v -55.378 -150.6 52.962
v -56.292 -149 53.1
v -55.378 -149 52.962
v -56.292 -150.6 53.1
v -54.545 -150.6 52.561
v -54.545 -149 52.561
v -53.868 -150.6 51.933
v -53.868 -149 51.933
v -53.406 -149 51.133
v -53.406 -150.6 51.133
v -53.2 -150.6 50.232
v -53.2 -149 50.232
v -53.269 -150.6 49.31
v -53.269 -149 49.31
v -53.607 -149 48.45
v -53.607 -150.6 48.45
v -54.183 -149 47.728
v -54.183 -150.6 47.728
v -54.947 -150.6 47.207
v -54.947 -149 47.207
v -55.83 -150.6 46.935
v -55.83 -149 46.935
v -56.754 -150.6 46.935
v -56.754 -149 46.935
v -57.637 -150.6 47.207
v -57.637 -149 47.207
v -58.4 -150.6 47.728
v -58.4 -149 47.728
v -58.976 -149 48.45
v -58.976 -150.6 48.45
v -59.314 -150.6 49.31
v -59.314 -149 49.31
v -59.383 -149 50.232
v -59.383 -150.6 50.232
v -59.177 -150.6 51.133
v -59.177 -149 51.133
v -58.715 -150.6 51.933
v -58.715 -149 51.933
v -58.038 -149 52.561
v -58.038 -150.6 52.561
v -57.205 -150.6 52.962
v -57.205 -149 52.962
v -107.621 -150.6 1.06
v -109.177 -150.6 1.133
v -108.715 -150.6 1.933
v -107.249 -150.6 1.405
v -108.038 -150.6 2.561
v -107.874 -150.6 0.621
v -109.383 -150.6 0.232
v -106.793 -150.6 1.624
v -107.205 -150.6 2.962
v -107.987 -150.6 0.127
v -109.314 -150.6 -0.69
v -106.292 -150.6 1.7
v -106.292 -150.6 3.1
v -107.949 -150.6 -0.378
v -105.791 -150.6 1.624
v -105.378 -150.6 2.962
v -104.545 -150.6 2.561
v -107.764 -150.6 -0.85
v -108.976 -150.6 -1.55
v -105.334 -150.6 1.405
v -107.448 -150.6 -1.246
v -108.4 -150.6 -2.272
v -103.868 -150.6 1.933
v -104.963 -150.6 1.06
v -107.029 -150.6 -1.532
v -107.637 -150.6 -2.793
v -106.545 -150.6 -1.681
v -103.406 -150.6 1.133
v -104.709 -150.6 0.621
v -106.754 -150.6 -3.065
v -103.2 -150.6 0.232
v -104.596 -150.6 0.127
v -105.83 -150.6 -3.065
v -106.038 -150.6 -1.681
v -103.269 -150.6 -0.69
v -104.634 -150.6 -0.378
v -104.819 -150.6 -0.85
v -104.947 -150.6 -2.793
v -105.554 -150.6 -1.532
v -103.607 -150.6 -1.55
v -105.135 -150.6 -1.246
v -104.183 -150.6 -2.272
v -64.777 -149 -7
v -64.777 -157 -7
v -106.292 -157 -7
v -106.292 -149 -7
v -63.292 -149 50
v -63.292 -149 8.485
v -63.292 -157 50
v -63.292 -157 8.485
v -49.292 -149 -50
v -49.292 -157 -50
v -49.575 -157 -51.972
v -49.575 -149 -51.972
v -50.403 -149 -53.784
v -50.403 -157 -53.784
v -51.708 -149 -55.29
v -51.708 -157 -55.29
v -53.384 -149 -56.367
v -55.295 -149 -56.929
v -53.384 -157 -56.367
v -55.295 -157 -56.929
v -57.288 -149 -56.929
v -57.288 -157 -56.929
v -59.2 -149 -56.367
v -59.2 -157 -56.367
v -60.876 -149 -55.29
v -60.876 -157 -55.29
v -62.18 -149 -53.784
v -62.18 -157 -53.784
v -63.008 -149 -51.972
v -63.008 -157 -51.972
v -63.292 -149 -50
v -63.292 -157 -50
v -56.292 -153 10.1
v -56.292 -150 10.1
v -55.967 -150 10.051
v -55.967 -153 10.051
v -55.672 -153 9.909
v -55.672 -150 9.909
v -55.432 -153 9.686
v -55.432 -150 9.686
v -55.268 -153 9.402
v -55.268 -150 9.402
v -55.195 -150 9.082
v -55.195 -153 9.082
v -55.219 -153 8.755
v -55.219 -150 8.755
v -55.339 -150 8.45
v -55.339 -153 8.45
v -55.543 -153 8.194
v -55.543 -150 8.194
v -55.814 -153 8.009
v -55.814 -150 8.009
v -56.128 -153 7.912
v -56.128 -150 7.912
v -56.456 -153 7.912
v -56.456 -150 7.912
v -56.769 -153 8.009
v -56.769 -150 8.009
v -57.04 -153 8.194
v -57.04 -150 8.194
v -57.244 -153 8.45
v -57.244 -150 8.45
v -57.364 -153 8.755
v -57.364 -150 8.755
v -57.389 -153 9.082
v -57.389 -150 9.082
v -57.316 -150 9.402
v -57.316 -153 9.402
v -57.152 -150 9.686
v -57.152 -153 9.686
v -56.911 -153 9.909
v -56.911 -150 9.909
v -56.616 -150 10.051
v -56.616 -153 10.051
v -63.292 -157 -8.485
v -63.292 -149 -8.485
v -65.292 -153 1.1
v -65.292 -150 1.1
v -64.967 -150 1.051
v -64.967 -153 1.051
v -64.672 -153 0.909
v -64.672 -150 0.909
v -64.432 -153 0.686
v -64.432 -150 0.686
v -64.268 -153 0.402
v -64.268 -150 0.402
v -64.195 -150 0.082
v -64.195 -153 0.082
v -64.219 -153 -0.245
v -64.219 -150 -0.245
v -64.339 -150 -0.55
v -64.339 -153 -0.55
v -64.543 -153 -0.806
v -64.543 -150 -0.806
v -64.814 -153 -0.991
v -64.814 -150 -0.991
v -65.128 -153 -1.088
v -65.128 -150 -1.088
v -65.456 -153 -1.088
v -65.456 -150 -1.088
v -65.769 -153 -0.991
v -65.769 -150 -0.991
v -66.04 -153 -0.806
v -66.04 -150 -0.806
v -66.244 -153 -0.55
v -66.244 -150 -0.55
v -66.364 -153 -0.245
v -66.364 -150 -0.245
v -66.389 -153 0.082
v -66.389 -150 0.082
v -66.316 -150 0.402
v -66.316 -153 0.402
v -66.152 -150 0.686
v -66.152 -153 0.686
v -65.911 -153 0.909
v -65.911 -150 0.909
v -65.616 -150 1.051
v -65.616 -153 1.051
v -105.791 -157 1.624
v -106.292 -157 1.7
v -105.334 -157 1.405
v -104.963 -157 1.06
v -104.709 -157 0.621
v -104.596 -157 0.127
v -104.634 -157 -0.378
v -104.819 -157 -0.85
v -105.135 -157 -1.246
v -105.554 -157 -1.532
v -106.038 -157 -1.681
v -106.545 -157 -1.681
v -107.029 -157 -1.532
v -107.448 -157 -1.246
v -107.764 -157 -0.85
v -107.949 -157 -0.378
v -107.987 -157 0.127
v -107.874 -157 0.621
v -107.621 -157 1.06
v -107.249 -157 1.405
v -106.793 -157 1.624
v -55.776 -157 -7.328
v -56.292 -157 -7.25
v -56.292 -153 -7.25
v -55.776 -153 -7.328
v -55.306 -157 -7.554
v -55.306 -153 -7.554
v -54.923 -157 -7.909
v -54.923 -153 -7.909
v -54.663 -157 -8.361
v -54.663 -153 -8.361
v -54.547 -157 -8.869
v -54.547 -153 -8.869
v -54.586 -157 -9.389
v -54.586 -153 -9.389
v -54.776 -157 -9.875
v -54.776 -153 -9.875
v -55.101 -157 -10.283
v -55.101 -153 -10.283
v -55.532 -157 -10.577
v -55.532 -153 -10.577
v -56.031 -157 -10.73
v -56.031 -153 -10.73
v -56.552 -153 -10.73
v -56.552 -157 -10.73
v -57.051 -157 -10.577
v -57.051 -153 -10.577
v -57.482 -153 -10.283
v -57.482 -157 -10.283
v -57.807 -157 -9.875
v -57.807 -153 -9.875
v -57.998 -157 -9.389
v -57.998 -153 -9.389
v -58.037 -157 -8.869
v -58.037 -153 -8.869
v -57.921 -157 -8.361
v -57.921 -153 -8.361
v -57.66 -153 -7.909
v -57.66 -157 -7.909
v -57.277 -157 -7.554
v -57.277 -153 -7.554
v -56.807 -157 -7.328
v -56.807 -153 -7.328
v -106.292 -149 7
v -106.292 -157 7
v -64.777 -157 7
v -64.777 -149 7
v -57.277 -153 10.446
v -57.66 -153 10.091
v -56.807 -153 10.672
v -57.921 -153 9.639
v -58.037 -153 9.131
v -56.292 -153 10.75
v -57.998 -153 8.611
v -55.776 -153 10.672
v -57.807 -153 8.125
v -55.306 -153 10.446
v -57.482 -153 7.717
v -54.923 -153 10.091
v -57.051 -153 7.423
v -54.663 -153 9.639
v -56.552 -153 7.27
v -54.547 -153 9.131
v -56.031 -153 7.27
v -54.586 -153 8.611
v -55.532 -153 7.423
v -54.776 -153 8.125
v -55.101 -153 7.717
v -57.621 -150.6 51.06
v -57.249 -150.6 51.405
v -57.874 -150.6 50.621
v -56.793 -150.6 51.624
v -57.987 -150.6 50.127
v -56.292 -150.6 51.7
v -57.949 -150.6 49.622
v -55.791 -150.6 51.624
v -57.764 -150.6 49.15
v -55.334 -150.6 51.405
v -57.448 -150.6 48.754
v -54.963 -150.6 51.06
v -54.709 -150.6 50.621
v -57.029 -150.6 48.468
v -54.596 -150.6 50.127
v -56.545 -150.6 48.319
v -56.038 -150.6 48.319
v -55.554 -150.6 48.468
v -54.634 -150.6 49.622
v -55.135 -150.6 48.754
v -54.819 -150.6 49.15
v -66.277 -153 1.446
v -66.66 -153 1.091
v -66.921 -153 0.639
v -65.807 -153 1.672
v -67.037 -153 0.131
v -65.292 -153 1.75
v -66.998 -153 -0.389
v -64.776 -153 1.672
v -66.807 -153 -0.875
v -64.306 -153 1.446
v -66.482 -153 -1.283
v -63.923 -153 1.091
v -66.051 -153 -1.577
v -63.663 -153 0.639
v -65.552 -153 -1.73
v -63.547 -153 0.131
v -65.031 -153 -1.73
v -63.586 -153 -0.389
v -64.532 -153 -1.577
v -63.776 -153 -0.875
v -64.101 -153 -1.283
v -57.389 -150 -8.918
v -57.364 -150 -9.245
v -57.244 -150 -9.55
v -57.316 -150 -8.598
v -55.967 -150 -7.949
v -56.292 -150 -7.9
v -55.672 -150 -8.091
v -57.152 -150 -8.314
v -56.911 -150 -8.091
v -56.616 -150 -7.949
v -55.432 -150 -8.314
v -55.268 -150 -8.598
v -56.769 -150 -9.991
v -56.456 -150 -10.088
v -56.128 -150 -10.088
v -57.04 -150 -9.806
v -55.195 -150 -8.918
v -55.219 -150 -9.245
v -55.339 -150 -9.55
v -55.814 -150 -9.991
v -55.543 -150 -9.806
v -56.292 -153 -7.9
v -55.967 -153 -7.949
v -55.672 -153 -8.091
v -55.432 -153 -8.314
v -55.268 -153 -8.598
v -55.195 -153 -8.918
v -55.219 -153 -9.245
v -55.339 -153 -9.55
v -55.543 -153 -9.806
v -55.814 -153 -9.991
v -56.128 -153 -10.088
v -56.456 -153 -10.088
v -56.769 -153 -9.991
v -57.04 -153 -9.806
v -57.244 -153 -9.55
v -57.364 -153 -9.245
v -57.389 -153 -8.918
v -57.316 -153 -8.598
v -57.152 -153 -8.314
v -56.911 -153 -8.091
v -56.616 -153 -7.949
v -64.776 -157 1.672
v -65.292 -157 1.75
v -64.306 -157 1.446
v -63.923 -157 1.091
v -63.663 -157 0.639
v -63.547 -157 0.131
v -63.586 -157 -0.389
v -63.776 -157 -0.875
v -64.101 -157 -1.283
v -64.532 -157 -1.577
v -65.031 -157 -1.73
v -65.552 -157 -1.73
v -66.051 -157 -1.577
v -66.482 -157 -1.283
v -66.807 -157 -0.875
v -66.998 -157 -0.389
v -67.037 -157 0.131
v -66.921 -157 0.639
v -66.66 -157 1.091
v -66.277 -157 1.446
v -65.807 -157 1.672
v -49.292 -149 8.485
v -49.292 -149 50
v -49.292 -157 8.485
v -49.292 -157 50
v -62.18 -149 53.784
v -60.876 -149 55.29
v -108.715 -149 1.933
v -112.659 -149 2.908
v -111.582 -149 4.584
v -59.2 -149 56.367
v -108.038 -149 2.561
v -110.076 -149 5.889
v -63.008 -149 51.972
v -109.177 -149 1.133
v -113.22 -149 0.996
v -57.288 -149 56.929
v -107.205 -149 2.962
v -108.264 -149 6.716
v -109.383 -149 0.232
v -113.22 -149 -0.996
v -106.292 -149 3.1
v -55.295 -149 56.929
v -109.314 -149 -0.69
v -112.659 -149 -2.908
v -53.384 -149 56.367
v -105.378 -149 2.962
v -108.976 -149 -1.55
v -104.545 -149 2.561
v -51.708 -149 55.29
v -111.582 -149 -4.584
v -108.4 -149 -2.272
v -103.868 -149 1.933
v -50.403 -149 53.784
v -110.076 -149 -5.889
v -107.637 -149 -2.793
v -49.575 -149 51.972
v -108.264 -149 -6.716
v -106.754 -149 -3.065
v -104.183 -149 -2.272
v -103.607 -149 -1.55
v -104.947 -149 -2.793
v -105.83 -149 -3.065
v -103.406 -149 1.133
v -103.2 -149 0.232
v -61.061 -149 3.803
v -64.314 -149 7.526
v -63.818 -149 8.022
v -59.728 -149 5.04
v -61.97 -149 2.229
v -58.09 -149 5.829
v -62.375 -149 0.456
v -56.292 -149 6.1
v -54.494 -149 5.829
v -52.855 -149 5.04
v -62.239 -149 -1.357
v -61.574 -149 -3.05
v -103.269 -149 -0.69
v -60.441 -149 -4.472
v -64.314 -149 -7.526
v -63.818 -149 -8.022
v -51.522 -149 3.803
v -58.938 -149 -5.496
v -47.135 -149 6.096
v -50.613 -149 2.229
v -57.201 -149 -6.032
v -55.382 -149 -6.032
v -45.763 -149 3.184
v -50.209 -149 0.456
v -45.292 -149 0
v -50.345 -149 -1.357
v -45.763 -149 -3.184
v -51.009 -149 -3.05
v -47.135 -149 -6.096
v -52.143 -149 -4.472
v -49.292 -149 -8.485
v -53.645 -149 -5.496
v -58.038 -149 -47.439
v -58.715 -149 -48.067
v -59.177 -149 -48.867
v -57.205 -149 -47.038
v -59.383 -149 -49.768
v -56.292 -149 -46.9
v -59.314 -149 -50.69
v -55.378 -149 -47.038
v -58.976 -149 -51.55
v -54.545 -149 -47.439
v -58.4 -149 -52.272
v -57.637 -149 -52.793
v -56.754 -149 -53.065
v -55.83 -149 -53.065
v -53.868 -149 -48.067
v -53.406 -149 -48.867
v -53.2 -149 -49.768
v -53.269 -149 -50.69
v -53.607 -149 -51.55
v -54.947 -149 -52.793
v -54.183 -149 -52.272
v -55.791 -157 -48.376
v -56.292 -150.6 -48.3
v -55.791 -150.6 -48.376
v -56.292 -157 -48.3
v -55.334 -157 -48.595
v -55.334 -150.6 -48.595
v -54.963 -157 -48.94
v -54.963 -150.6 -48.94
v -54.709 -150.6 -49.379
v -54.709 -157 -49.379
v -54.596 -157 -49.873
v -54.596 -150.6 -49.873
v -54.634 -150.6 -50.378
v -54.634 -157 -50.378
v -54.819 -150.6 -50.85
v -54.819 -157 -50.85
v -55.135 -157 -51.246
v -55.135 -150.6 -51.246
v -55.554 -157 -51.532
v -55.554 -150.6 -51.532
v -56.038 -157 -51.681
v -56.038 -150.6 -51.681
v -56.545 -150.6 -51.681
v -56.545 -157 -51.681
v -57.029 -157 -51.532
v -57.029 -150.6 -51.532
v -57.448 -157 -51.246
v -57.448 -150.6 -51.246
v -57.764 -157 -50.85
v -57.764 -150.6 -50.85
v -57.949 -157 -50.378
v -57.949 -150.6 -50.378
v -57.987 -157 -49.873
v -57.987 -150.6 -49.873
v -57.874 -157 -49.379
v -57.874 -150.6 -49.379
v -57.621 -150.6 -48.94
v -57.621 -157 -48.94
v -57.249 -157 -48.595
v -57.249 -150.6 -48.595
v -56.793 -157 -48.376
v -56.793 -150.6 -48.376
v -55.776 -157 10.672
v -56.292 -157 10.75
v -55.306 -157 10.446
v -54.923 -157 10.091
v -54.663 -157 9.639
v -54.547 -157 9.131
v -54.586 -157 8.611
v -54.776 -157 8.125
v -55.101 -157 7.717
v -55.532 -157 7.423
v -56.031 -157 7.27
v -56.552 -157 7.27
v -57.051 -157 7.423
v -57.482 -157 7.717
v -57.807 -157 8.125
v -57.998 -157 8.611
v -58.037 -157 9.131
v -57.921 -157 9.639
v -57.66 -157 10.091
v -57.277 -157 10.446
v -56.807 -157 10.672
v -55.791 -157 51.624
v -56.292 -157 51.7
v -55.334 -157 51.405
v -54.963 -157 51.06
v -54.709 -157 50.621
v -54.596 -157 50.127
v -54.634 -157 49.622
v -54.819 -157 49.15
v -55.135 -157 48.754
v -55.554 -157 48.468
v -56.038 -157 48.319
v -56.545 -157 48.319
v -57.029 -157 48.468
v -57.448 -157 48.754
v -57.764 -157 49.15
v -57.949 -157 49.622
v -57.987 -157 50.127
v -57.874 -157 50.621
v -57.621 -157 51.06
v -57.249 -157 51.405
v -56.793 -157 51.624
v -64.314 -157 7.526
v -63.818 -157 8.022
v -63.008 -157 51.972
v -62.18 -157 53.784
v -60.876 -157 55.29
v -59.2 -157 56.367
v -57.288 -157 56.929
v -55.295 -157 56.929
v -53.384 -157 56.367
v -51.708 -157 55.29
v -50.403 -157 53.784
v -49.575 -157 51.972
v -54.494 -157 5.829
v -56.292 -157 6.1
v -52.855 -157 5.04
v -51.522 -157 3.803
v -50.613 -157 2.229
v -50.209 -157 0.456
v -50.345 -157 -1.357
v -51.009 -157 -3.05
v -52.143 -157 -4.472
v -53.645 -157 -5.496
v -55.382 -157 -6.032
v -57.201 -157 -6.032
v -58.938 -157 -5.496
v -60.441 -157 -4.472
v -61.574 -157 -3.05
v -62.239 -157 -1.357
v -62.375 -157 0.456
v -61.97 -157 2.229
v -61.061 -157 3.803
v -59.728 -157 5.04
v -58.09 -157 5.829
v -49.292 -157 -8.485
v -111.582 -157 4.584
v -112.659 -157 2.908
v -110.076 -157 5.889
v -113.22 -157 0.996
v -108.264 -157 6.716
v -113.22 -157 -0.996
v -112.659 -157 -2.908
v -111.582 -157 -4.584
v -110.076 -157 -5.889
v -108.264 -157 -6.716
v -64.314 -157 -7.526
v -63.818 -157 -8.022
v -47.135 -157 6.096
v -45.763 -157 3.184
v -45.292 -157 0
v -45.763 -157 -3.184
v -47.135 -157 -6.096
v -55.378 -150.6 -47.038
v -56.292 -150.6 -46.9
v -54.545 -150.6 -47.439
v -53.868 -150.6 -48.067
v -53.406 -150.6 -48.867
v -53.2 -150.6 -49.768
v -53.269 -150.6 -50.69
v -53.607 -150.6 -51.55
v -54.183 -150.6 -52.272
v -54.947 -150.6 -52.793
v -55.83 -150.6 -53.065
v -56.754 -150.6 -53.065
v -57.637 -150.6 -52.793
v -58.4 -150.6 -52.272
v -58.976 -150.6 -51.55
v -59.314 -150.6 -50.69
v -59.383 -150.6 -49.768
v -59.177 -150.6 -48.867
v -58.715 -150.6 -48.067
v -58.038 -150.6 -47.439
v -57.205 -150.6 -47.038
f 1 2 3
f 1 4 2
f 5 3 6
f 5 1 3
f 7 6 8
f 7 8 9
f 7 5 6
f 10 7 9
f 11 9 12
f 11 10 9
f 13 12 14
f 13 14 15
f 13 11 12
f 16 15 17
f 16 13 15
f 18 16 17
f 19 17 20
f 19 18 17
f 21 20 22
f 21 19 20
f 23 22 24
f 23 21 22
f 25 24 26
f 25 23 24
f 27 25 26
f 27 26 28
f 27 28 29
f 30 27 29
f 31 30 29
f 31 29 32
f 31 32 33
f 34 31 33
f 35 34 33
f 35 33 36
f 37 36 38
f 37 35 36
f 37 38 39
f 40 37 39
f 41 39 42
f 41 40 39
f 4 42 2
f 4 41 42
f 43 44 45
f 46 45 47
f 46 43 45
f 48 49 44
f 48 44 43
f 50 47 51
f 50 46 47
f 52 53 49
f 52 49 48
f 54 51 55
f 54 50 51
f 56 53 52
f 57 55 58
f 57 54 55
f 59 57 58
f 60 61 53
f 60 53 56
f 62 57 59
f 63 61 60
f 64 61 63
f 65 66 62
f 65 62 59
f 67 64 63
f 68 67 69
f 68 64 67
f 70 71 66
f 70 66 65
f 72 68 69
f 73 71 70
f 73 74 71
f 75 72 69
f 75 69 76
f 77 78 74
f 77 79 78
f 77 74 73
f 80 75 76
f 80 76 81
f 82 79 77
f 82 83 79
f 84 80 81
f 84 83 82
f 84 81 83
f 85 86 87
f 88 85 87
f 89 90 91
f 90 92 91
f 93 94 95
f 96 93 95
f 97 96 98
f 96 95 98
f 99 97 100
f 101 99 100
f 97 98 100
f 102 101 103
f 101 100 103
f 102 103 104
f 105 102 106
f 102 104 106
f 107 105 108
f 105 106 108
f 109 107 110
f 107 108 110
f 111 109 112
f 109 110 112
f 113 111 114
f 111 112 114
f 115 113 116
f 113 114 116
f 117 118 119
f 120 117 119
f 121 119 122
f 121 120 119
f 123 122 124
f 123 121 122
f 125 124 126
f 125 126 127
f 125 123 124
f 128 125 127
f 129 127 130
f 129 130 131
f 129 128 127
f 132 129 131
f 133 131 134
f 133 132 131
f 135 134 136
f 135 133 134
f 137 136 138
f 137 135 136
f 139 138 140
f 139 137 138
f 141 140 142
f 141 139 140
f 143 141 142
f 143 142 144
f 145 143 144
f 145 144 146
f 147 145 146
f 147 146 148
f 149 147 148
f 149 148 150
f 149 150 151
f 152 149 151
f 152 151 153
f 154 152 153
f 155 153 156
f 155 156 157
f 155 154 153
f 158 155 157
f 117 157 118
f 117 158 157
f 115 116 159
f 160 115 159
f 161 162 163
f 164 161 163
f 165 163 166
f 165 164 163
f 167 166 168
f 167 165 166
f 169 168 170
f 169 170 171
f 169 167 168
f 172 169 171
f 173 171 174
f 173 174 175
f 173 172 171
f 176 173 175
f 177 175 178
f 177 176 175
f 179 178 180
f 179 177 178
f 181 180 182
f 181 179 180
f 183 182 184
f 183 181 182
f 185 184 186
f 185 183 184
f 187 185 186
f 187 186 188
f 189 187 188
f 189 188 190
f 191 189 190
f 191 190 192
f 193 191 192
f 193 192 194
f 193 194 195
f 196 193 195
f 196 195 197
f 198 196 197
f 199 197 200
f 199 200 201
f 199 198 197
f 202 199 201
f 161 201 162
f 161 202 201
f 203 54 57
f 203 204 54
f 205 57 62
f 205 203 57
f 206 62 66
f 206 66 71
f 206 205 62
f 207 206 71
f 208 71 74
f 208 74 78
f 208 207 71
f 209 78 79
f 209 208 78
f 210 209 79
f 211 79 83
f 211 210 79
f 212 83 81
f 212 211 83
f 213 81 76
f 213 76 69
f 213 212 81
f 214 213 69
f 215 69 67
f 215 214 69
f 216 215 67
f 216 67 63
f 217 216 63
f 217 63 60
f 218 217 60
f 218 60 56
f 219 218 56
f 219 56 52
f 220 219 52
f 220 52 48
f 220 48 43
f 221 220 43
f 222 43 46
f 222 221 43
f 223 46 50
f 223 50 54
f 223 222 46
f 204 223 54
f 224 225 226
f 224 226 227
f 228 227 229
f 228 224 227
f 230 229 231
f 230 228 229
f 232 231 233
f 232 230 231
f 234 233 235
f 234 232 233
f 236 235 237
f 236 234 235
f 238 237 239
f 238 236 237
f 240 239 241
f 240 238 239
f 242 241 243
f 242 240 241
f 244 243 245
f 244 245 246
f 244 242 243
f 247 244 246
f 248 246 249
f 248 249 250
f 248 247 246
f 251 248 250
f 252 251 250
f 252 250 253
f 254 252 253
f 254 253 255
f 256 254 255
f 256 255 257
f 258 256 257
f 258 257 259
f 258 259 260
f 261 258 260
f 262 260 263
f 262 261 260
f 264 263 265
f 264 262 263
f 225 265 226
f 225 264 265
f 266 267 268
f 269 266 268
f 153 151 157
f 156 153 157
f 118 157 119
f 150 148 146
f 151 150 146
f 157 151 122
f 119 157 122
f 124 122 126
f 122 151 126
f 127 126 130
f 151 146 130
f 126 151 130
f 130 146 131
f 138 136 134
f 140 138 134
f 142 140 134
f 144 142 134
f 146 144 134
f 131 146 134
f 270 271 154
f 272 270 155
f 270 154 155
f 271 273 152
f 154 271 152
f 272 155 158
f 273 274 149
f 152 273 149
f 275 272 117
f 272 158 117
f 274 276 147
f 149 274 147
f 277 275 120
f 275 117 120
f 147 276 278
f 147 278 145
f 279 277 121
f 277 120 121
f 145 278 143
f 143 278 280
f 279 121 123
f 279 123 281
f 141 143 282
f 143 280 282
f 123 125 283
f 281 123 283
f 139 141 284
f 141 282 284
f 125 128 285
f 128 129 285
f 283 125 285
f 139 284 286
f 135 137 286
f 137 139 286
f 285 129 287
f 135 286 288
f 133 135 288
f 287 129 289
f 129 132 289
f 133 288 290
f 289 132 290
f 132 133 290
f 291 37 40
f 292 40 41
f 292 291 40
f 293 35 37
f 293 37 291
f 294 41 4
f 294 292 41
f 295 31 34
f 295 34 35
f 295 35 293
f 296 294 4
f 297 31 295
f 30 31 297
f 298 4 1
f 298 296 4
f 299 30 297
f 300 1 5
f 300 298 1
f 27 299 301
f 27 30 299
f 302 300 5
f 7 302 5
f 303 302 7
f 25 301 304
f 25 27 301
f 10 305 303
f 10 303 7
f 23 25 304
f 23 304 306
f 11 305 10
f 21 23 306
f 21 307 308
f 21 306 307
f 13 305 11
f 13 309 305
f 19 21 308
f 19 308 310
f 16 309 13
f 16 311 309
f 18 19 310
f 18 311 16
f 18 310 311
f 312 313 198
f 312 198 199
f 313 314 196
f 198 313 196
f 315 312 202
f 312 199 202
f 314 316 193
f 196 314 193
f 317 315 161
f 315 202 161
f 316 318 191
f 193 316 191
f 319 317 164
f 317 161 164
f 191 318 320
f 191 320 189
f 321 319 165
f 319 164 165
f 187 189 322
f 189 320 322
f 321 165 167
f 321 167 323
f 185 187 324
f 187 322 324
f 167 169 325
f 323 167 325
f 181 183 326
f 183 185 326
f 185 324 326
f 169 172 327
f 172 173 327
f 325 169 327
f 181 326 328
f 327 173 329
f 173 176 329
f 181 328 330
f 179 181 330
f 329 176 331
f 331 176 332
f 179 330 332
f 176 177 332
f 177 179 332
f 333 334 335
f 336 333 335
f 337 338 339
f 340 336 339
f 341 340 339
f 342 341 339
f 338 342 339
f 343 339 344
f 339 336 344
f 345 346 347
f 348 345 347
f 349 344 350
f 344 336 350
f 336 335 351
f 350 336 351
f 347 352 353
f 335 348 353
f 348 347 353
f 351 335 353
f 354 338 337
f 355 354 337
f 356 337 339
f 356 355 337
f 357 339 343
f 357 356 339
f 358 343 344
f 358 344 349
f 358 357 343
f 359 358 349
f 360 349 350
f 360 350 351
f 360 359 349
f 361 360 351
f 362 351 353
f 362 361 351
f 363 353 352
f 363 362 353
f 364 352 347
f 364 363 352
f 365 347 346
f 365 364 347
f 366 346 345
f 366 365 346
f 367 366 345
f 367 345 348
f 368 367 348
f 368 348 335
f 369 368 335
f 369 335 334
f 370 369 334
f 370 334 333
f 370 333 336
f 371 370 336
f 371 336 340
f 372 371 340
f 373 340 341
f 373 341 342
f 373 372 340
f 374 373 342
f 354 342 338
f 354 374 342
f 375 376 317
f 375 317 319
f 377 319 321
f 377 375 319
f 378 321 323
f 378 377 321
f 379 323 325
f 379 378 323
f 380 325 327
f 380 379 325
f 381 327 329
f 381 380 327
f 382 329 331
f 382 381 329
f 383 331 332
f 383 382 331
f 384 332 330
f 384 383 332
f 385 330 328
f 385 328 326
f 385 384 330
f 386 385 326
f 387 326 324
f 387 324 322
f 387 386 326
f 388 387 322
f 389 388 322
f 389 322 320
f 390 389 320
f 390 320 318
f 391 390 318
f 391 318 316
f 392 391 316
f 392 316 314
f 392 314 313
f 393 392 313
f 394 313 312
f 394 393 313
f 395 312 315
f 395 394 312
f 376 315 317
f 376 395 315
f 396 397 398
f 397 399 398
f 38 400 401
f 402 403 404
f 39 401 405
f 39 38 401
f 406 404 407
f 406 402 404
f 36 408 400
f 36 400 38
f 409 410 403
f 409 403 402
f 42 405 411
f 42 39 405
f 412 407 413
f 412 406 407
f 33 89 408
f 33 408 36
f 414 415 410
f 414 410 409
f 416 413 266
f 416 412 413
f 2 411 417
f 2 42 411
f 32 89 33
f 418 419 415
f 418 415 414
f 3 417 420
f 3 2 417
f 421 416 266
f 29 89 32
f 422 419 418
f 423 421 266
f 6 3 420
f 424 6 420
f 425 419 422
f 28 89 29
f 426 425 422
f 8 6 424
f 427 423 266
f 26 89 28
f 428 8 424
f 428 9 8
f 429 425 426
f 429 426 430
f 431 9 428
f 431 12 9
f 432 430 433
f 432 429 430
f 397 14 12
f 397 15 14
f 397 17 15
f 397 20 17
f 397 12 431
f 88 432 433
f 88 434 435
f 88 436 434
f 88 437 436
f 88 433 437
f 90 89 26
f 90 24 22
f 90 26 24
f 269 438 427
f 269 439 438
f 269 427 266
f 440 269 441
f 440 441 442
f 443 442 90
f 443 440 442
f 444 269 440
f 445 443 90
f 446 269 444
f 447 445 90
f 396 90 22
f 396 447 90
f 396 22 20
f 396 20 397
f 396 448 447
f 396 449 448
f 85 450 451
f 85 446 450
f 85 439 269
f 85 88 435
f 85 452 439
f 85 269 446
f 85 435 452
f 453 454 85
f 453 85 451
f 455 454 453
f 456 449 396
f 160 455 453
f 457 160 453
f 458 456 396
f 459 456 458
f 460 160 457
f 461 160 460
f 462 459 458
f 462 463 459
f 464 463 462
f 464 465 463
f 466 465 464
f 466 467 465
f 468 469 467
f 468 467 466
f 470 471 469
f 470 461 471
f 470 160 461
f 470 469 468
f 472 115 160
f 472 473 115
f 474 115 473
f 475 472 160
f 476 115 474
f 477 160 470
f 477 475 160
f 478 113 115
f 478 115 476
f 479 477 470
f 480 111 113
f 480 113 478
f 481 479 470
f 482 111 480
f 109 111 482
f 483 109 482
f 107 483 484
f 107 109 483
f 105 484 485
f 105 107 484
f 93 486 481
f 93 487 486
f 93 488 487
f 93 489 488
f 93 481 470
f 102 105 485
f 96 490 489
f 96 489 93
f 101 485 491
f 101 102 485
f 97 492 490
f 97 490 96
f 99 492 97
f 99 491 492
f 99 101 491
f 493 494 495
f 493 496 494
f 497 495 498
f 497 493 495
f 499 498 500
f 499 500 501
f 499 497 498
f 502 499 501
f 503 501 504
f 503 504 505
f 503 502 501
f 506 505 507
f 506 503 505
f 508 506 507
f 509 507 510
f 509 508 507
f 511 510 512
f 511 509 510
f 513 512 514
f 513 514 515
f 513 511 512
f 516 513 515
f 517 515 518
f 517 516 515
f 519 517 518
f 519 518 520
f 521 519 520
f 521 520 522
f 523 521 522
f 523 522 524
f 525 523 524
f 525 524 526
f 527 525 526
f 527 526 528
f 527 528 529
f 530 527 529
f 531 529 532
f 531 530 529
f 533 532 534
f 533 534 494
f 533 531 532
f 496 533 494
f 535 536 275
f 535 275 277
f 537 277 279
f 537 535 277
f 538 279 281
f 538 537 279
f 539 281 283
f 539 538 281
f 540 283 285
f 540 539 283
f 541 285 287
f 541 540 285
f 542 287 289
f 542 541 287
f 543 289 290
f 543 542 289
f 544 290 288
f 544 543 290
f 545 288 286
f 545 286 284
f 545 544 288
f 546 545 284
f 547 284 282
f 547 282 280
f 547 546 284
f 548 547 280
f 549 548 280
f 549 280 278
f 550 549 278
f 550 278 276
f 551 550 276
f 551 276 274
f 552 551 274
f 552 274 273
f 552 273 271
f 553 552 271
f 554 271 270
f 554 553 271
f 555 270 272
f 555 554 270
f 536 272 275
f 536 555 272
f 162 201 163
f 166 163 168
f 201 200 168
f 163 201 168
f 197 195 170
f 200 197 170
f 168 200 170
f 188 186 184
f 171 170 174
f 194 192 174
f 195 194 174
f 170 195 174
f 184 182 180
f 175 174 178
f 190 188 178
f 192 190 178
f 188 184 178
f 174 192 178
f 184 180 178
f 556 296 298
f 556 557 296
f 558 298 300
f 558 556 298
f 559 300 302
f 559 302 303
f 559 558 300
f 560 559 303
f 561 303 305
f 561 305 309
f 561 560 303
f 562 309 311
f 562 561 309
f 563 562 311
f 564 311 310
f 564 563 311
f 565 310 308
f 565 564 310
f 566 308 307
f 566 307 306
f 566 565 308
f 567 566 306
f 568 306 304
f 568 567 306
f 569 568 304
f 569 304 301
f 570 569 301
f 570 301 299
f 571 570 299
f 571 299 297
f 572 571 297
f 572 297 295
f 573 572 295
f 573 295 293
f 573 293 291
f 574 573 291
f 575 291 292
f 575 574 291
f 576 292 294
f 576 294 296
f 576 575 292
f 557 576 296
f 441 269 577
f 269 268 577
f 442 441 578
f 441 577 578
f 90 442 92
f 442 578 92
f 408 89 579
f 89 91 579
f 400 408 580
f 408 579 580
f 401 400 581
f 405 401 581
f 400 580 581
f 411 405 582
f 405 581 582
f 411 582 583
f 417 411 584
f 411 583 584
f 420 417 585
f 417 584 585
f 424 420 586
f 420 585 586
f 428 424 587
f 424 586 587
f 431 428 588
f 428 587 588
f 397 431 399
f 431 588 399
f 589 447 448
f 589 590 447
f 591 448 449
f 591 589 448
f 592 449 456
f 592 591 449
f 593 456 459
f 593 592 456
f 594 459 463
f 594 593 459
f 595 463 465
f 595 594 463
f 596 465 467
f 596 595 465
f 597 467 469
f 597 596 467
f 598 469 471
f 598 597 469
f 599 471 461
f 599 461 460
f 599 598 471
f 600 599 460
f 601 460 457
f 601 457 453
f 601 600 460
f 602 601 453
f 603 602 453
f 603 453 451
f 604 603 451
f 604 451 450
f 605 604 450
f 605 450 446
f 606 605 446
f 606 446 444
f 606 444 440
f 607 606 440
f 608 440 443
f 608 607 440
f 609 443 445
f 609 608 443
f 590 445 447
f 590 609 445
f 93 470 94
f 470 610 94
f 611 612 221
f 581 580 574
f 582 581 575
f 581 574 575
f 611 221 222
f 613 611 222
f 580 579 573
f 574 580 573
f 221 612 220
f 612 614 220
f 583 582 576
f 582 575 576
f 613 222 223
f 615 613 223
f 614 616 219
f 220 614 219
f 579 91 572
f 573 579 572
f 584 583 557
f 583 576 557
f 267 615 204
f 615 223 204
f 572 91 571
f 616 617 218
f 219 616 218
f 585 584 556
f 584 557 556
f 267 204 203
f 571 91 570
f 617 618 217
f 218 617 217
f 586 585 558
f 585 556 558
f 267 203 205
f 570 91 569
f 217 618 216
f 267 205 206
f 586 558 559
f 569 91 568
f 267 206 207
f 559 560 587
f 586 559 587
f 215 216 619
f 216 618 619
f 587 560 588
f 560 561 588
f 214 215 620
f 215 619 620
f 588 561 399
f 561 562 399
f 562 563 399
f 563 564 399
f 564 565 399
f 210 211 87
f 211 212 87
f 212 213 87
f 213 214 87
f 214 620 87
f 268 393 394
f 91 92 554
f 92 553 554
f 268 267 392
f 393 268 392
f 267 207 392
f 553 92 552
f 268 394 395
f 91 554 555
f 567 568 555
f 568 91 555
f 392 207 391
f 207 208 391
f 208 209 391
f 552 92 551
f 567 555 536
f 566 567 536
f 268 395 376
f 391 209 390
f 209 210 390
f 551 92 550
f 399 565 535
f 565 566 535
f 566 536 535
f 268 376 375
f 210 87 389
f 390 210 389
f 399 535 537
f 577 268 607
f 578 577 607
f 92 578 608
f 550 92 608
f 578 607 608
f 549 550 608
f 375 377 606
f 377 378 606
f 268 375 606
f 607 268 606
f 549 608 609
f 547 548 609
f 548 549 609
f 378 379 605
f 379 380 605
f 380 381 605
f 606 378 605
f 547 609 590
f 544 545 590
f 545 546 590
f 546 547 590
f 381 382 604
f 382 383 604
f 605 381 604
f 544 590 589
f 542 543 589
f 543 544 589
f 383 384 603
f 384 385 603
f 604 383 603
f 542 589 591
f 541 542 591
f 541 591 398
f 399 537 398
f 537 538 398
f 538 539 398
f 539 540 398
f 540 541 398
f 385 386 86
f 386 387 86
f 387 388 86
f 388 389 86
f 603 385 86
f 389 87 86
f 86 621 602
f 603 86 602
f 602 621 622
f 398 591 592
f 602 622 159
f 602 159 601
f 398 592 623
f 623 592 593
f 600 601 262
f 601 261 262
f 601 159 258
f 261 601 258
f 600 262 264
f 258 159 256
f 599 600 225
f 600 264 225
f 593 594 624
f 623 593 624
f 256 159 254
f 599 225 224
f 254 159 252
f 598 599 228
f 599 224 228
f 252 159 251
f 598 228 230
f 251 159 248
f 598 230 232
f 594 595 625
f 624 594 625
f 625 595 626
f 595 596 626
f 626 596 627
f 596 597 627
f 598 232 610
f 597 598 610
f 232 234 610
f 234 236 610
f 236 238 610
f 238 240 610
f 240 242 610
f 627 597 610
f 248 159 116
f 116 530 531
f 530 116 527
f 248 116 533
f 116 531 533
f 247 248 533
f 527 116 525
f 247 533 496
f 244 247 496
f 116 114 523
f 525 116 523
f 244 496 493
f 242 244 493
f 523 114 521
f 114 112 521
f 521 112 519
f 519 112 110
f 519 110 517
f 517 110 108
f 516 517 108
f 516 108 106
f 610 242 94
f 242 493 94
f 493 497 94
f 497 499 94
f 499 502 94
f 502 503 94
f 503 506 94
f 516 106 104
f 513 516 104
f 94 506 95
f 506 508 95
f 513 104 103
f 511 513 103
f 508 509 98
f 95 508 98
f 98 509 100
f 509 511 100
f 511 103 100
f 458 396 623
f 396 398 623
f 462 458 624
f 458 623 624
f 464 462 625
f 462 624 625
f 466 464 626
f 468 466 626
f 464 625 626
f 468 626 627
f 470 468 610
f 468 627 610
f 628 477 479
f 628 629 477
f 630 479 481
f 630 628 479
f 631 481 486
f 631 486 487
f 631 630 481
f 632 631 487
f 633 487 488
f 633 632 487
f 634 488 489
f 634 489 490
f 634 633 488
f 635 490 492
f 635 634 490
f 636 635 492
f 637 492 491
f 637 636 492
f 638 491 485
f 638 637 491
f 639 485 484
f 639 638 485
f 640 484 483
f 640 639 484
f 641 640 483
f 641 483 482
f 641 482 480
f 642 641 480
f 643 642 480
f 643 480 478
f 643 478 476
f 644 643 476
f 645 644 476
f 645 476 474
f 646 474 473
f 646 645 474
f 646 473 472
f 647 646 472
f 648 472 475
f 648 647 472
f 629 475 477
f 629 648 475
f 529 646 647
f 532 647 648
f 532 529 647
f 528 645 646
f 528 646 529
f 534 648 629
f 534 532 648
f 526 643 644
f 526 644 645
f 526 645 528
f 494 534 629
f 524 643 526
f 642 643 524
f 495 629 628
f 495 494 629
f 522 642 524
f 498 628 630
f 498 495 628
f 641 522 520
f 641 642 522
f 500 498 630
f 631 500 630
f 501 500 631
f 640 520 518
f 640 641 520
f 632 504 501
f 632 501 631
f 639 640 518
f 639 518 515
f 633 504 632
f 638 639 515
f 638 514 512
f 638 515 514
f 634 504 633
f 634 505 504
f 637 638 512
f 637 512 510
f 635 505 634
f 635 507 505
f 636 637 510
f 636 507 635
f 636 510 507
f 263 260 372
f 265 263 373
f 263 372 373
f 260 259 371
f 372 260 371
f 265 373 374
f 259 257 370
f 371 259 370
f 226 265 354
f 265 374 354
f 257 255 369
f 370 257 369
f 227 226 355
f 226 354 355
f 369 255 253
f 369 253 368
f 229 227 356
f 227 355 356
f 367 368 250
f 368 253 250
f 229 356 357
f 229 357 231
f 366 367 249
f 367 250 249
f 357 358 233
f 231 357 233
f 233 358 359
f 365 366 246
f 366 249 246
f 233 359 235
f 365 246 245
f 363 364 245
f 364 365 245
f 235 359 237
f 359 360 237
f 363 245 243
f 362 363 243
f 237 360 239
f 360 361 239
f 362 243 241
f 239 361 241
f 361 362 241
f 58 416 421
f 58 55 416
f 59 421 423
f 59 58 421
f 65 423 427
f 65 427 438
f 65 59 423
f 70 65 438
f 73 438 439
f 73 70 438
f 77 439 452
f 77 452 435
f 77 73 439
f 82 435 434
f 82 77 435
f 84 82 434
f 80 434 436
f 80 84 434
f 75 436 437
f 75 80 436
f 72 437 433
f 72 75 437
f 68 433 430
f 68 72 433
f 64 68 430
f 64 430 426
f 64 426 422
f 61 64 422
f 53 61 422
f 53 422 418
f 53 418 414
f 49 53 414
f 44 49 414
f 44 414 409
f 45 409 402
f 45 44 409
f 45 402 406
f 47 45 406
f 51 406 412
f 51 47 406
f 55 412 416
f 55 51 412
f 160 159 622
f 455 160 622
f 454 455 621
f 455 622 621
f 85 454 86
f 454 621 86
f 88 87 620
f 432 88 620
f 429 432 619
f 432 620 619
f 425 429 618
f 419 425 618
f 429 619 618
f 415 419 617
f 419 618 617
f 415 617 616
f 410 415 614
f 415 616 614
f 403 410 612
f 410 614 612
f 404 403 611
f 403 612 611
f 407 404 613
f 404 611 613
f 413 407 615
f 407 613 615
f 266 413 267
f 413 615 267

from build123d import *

# Parameters (mm, degrees)
BASE_OUTLINE_SKETCH_R          = 1.7
BASE_OUTLINE_SKETCH_R_2        = 1.75
BASE_OUTLINE_SKETCH_R_3        = 6.1
BASE_OUTLINE_DEPTH             = 4
INTERFACE_PROFILE_2_SKETCH_R   = 1.7
INTERFACE_PROFILE_2_SKETCH_R_2 = 6.1
INTERFACE_PROFILE_2_SKETCH_R_3 = 1.1
INTERFACE_PROFILE_2_DEPTH      = 2.4
INTERFACE_PROFILE_3_SKETCH_R   = 6.1
INTERFACE_PROFILE_3_SKETCH_R_2 = 3.1
INTERFACE_PROFILE_3_SKETCH_R_3 = 1.1
INTERFACE_PROFILE_3_DEPTH      = 0.6
INTERFACE_PROFILE_4_SKETCH_R   = 6.1
INTERFACE_PROFILE_4_SKETCH_R_2 = 3.1
INTERFACE_PROFILE_4_DEPTH      = 1


with BuildPart() as part:
    # Base Outline Sketch → Base Outline (new body)
    with BuildSketch(Plane(origin=(0, -157, 0), x_dir=(1, 0, 0), z_dir=(0, 1, 0))):
        with BuildLine():
            Line((-106.291651246, -7), (-64.77693262, -7))
            ThreePointArc((-64.77693262, -7), (-64.069825839, -7.778174593), (-63.291651246, -8.485281374))
            Line((-63.291651246, -8.485281374), (-63.291651246, -50))
            ThreePointArc((-63.291651246, -50), (-56.291651246, -57), (-49.291651246, -50))
            Line((-49.291651246, -50), (-49.291651246, -8.485281374))
            ThreePointArc((-49.291651246, -8.485281374), (-45.291651246, 0), (-49.291651246, 8.485281374))
            Line((-49.291651246, 8.485281374), (-49.291651246, 50))
            ThreePointArc((-49.291651246, 50), (-56.291651246, 57), (-63.291651246, 50))
            Line((-63.291651246, 50), (-63.291651246, 8.485281374))
            ThreePointArc((-63.291651246, 8.485281374), (-64.069825839, 7.778174593), (-64.77693262, 7))
            Line((-64.77693262, 7), (-106.291651246, 7))
            ThreePointArc((-106.291651246, 7), (-113.291651246, 0), (-106.291651246, -7))
        make_face()
        with Locations(Location((-106.291651246, 0, 0), (0, 0, 270))):
            Circle(BASE_OUTLINE_SKETCH_R, mode=Mode.SUBTRACT)
        with Locations(Location((-56.291651246, 50, 0), (0, 0, 270))):
            Circle(BASE_OUTLINE_SKETCH_R, mode=Mode.SUBTRACT)
        with Locations(Location((-56.291651246, 9, 0), (0, 0, 270))):
            Circle(BASE_OUTLINE_SKETCH_R_2, mode=Mode.SUBTRACT)
        with Locations(Location((-65.291651246, 0, 0), (0, 0, 270))):
            Circle(BASE_OUTLINE_SKETCH_R_2, mode=Mode.SUBTRACT)
        with Locations(Location((-56.291651246, 0, 0), (0, 0, 270))):
            Circle(BASE_OUTLINE_SKETCH_R_3, mode=Mode.SUBTRACT)
        with Locations(Location((-56.291651246, -9, 0), (0, 0, 270))):
            Circle(BASE_OUTLINE_SKETCH_R_2, mode=Mode.SUBTRACT)
        with Locations(Location((-56.291651246, -50, 0), (0, 0, 270))):
            Circle(BASE_OUTLINE_SKETCH_R, mode=Mode.SUBTRACT)
    extrude(amount=BASE_OUTLINE_DEPTH)

    # Interface Profile 2 Sketch → Interface Profile 2 (add)
    with BuildSketch(Plane(origin=(0, -153, 0), x_dir=(1, 0, 0), z_dir=(0, 1, 0))):
        with BuildLine():
            Line((-106.291651246, -7), (-64.77693262, -7))
            ThreePointArc((-64.77693262, -7), (-64.069825839, -7.778174593), (-63.291651246, -8.485281374))
            Line((-63.291651246, -8.485281374), (-63.291651246, -50))
            ThreePointArc((-63.291651246, -50), (-56.291651246, -57), (-49.291651246, -50))
            Line((-49.291651246, -50), (-49.291651246, -8.485281374))
            ThreePointArc((-49.291651246, -8.485281374), (-45.291651246, 0), (-49.291651246, 8.485281374))
            Line((-49.291651246, 8.485281374), (-49.291651246, 50))
            ThreePointArc((-49.291651246, 50), (-56.291651246, 57), (-63.291651246, 50))
            Line((-63.291651246, 50), (-63.291651246, 8.485281374))
            ThreePointArc((-63.291651246, 8.485281374), (-64.069825839, 7.778174593), (-64.77693262, 7))
            Line((-64.77693262, 7), (-106.291651246, 7))
            ThreePointArc((-106.291651246, 7), (-113.291651246, 0), (-106.291651246, -7))
        make_face()
        with Locations(Location((-106.291651246, 0, 0), (0, 0, 270))):
            Circle(INTERFACE_PROFILE_2_SKETCH_R, mode=Mode.SUBTRACT)
        with Locations(Location((-56.291651246, 50, 0), (0, 0, 270))):
            Circle(INTERFACE_PROFILE_2_SKETCH_R, mode=Mode.SUBTRACT)
        with Locations(Location((-56.291651246, 0, 0), (0, 0, 270))):
            Circle(INTERFACE_PROFILE_2_SKETCH_R_2, mode=Mode.SUBTRACT)
        with Locations(Location((-56.291651246, -50, 0), (0, 0, 270))):
            Circle(INTERFACE_PROFILE_2_SKETCH_R, mode=Mode.SUBTRACT)
        with Locations(Location((-56.291651246, 9, 0), (0, 0, 270))):
            Circle(INTERFACE_PROFILE_2_SKETCH_R_3, mode=Mode.SUBTRACT)
        with Locations(Location((-65.291651246, 0, 0), (0, 0, 270))):
            Circle(INTERFACE_PROFILE_2_SKETCH_R_3, mode=Mode.SUBTRACT)
        with Locations(Location((-56.291651246, -9, 0), (0, 0, 270))):
            Circle(INTERFACE_PROFILE_2_SKETCH_R_3, mode=Mode.SUBTRACT)
    extrude(amount=INTERFACE_PROFILE_2_DEPTH)

    # Interface Profile 3 Sketch → Interface Profile 3 (add)
    with BuildSketch(Plane(origin=(0, -150.6, 0), x_dir=(1, 0, 0), z_dir=(0, 1, 0))):
        with BuildLine():
            Line((-106.291651246, -7), (-64.77693262, -7))
            ThreePointArc((-64.77693262, -7), (-64.069825839, -7.778174593), (-63.291651246, -8.485281374))
            Line((-63.291651246, -8.485281374), (-63.291651246, -50))
            ThreePointArc((-63.291651246, -50), (-56.291651246, -57), (-49.291651246, -50))
            Line((-49.291651246, -50), (-49.291651246, -8.485281374))
            ThreePointArc((-49.291651246, -8.485281374), (-45.291651246, 0), (-49.291651246, 8.485281374))
            Line((-49.291651246, 8.485281374), (-49.291651246, 50))
            ThreePointArc((-49.291651246, 50), (-56.291651246, 57), (-63.291651246, 50))
            Line((-63.291651246, 50), (-63.291651246, 8.485281374))
            ThreePointArc((-63.291651246, 8.485281374), (-64.069825839, 7.778174593), (-64.77693262, 7))
            Line((-64.77693262, 7), (-106.291651246, 7))
            ThreePointArc((-106.291651246, 7), (-113.291651246, 0), (-106.291651246, -7))
        make_face()
        with Locations(Location((-56.291651246, 0, 0), (0, 0, 270))):
            Circle(INTERFACE_PROFILE_3_SKETCH_R, mode=Mode.SUBTRACT)
        with Locations(Location((-106.291651246, 0, 0), (0, 0, 270))):
            Circle(INTERFACE_PROFILE_3_SKETCH_R_2, mode=Mode.SUBTRACT)
        with Locations(Location((-56.291651246, 50, 0), (0, 0, 270))):
            Circle(INTERFACE_PROFILE_3_SKETCH_R_2, mode=Mode.SUBTRACT)
        with Locations(Location((-56.291651246, -50, 0), (0, 0, 270))):
            Circle(INTERFACE_PROFILE_3_SKETCH_R_2, mode=Mode.SUBTRACT)
        with Locations(Location((-56.291651246, 9, 0), (0, 0, 270))):
            Circle(INTERFACE_PROFILE_3_SKETCH_R_3, mode=Mode.SUBTRACT)
        with Locations(Location((-65.291651246, 0, 0), (0, 0, 270))):
            Circle(INTERFACE_PROFILE_3_SKETCH_R_3, mode=Mode.SUBTRACT)
        with Locations(Location((-56.291651246, -9, 0), (0, 0, 270))):
            Circle(INTERFACE_PROFILE_3_SKETCH_R_3, mode=Mode.SUBTRACT)
    extrude(amount=INTERFACE_PROFILE_3_DEPTH)

    # Interface Profile 4 Sketch → Interface Profile 4 (add)
    with BuildSketch(Plane(origin=(0, -150, 0), x_dir=(1, 0, 0), z_dir=(0, 1, 0))):
        with BuildLine():
            Line((-106.291651246, -7), (-64.77693262, -7))
            ThreePointArc((-64.77693262, -7), (-64.069825839, -7.778174593), (-63.291651246, -8.485281374))
            Line((-63.291651246, -8.485281374), (-63.291651246, -50))
            ThreePointArc((-63.291651246, -50), (-56.291651246, -57), (-49.291651246, -50))
            Line((-49.291651246, -50), (-49.291651246, -8.485281374))
            ThreePointArc((-49.291651246, -8.485281374), (-45.291651246, 0), (-49.291651246, 8.485281374))
            Line((-49.291651246, 8.485281374), (-49.291651246, 50))
            ThreePointArc((-49.291651246, 50), (-56.291651246, 57), (-63.291651246, 50))
            Line((-63.291651246, 50), (-63.291651246, 8.485281374))
            ThreePointArc((-63.291651246, 8.485281374), (-64.069825839, 7.778174593), (-64.77693262, 7))
            Line((-64.77693262, 7), (-106.291651246, 7))
            ThreePointArc((-106.291651246, 7), (-113.291651246, 0), (-106.291651246, -7))
        make_face()
        with Locations(Location((-56.291651246, 0, 0), (0, 0, 270))):
            Circle(INTERFACE_PROFILE_4_SKETCH_R, mode=Mode.SUBTRACT)
        with Locations(Location((-106.291651246, 0, 0), (0, 0, 270))):
            Circle(INTERFACE_PROFILE_4_SKETCH_R_2, mode=Mode.SUBTRACT)
        with Locations(Location((-56.291651246, 50, 0), (0, 0, 270))):
            Circle(INTERFACE_PROFILE_4_SKETCH_R_2, mode=Mode.SUBTRACT)
        with Locations(Location((-56.291651246, -50, 0), (0, 0, 270))):
            Circle(INTERFACE_PROFILE_4_SKETCH_R_2, mode=Mode.SUBTRACT)
    extrude(amount=INTERFACE_PROFILE_4_DEPTH)


solid = part.part
